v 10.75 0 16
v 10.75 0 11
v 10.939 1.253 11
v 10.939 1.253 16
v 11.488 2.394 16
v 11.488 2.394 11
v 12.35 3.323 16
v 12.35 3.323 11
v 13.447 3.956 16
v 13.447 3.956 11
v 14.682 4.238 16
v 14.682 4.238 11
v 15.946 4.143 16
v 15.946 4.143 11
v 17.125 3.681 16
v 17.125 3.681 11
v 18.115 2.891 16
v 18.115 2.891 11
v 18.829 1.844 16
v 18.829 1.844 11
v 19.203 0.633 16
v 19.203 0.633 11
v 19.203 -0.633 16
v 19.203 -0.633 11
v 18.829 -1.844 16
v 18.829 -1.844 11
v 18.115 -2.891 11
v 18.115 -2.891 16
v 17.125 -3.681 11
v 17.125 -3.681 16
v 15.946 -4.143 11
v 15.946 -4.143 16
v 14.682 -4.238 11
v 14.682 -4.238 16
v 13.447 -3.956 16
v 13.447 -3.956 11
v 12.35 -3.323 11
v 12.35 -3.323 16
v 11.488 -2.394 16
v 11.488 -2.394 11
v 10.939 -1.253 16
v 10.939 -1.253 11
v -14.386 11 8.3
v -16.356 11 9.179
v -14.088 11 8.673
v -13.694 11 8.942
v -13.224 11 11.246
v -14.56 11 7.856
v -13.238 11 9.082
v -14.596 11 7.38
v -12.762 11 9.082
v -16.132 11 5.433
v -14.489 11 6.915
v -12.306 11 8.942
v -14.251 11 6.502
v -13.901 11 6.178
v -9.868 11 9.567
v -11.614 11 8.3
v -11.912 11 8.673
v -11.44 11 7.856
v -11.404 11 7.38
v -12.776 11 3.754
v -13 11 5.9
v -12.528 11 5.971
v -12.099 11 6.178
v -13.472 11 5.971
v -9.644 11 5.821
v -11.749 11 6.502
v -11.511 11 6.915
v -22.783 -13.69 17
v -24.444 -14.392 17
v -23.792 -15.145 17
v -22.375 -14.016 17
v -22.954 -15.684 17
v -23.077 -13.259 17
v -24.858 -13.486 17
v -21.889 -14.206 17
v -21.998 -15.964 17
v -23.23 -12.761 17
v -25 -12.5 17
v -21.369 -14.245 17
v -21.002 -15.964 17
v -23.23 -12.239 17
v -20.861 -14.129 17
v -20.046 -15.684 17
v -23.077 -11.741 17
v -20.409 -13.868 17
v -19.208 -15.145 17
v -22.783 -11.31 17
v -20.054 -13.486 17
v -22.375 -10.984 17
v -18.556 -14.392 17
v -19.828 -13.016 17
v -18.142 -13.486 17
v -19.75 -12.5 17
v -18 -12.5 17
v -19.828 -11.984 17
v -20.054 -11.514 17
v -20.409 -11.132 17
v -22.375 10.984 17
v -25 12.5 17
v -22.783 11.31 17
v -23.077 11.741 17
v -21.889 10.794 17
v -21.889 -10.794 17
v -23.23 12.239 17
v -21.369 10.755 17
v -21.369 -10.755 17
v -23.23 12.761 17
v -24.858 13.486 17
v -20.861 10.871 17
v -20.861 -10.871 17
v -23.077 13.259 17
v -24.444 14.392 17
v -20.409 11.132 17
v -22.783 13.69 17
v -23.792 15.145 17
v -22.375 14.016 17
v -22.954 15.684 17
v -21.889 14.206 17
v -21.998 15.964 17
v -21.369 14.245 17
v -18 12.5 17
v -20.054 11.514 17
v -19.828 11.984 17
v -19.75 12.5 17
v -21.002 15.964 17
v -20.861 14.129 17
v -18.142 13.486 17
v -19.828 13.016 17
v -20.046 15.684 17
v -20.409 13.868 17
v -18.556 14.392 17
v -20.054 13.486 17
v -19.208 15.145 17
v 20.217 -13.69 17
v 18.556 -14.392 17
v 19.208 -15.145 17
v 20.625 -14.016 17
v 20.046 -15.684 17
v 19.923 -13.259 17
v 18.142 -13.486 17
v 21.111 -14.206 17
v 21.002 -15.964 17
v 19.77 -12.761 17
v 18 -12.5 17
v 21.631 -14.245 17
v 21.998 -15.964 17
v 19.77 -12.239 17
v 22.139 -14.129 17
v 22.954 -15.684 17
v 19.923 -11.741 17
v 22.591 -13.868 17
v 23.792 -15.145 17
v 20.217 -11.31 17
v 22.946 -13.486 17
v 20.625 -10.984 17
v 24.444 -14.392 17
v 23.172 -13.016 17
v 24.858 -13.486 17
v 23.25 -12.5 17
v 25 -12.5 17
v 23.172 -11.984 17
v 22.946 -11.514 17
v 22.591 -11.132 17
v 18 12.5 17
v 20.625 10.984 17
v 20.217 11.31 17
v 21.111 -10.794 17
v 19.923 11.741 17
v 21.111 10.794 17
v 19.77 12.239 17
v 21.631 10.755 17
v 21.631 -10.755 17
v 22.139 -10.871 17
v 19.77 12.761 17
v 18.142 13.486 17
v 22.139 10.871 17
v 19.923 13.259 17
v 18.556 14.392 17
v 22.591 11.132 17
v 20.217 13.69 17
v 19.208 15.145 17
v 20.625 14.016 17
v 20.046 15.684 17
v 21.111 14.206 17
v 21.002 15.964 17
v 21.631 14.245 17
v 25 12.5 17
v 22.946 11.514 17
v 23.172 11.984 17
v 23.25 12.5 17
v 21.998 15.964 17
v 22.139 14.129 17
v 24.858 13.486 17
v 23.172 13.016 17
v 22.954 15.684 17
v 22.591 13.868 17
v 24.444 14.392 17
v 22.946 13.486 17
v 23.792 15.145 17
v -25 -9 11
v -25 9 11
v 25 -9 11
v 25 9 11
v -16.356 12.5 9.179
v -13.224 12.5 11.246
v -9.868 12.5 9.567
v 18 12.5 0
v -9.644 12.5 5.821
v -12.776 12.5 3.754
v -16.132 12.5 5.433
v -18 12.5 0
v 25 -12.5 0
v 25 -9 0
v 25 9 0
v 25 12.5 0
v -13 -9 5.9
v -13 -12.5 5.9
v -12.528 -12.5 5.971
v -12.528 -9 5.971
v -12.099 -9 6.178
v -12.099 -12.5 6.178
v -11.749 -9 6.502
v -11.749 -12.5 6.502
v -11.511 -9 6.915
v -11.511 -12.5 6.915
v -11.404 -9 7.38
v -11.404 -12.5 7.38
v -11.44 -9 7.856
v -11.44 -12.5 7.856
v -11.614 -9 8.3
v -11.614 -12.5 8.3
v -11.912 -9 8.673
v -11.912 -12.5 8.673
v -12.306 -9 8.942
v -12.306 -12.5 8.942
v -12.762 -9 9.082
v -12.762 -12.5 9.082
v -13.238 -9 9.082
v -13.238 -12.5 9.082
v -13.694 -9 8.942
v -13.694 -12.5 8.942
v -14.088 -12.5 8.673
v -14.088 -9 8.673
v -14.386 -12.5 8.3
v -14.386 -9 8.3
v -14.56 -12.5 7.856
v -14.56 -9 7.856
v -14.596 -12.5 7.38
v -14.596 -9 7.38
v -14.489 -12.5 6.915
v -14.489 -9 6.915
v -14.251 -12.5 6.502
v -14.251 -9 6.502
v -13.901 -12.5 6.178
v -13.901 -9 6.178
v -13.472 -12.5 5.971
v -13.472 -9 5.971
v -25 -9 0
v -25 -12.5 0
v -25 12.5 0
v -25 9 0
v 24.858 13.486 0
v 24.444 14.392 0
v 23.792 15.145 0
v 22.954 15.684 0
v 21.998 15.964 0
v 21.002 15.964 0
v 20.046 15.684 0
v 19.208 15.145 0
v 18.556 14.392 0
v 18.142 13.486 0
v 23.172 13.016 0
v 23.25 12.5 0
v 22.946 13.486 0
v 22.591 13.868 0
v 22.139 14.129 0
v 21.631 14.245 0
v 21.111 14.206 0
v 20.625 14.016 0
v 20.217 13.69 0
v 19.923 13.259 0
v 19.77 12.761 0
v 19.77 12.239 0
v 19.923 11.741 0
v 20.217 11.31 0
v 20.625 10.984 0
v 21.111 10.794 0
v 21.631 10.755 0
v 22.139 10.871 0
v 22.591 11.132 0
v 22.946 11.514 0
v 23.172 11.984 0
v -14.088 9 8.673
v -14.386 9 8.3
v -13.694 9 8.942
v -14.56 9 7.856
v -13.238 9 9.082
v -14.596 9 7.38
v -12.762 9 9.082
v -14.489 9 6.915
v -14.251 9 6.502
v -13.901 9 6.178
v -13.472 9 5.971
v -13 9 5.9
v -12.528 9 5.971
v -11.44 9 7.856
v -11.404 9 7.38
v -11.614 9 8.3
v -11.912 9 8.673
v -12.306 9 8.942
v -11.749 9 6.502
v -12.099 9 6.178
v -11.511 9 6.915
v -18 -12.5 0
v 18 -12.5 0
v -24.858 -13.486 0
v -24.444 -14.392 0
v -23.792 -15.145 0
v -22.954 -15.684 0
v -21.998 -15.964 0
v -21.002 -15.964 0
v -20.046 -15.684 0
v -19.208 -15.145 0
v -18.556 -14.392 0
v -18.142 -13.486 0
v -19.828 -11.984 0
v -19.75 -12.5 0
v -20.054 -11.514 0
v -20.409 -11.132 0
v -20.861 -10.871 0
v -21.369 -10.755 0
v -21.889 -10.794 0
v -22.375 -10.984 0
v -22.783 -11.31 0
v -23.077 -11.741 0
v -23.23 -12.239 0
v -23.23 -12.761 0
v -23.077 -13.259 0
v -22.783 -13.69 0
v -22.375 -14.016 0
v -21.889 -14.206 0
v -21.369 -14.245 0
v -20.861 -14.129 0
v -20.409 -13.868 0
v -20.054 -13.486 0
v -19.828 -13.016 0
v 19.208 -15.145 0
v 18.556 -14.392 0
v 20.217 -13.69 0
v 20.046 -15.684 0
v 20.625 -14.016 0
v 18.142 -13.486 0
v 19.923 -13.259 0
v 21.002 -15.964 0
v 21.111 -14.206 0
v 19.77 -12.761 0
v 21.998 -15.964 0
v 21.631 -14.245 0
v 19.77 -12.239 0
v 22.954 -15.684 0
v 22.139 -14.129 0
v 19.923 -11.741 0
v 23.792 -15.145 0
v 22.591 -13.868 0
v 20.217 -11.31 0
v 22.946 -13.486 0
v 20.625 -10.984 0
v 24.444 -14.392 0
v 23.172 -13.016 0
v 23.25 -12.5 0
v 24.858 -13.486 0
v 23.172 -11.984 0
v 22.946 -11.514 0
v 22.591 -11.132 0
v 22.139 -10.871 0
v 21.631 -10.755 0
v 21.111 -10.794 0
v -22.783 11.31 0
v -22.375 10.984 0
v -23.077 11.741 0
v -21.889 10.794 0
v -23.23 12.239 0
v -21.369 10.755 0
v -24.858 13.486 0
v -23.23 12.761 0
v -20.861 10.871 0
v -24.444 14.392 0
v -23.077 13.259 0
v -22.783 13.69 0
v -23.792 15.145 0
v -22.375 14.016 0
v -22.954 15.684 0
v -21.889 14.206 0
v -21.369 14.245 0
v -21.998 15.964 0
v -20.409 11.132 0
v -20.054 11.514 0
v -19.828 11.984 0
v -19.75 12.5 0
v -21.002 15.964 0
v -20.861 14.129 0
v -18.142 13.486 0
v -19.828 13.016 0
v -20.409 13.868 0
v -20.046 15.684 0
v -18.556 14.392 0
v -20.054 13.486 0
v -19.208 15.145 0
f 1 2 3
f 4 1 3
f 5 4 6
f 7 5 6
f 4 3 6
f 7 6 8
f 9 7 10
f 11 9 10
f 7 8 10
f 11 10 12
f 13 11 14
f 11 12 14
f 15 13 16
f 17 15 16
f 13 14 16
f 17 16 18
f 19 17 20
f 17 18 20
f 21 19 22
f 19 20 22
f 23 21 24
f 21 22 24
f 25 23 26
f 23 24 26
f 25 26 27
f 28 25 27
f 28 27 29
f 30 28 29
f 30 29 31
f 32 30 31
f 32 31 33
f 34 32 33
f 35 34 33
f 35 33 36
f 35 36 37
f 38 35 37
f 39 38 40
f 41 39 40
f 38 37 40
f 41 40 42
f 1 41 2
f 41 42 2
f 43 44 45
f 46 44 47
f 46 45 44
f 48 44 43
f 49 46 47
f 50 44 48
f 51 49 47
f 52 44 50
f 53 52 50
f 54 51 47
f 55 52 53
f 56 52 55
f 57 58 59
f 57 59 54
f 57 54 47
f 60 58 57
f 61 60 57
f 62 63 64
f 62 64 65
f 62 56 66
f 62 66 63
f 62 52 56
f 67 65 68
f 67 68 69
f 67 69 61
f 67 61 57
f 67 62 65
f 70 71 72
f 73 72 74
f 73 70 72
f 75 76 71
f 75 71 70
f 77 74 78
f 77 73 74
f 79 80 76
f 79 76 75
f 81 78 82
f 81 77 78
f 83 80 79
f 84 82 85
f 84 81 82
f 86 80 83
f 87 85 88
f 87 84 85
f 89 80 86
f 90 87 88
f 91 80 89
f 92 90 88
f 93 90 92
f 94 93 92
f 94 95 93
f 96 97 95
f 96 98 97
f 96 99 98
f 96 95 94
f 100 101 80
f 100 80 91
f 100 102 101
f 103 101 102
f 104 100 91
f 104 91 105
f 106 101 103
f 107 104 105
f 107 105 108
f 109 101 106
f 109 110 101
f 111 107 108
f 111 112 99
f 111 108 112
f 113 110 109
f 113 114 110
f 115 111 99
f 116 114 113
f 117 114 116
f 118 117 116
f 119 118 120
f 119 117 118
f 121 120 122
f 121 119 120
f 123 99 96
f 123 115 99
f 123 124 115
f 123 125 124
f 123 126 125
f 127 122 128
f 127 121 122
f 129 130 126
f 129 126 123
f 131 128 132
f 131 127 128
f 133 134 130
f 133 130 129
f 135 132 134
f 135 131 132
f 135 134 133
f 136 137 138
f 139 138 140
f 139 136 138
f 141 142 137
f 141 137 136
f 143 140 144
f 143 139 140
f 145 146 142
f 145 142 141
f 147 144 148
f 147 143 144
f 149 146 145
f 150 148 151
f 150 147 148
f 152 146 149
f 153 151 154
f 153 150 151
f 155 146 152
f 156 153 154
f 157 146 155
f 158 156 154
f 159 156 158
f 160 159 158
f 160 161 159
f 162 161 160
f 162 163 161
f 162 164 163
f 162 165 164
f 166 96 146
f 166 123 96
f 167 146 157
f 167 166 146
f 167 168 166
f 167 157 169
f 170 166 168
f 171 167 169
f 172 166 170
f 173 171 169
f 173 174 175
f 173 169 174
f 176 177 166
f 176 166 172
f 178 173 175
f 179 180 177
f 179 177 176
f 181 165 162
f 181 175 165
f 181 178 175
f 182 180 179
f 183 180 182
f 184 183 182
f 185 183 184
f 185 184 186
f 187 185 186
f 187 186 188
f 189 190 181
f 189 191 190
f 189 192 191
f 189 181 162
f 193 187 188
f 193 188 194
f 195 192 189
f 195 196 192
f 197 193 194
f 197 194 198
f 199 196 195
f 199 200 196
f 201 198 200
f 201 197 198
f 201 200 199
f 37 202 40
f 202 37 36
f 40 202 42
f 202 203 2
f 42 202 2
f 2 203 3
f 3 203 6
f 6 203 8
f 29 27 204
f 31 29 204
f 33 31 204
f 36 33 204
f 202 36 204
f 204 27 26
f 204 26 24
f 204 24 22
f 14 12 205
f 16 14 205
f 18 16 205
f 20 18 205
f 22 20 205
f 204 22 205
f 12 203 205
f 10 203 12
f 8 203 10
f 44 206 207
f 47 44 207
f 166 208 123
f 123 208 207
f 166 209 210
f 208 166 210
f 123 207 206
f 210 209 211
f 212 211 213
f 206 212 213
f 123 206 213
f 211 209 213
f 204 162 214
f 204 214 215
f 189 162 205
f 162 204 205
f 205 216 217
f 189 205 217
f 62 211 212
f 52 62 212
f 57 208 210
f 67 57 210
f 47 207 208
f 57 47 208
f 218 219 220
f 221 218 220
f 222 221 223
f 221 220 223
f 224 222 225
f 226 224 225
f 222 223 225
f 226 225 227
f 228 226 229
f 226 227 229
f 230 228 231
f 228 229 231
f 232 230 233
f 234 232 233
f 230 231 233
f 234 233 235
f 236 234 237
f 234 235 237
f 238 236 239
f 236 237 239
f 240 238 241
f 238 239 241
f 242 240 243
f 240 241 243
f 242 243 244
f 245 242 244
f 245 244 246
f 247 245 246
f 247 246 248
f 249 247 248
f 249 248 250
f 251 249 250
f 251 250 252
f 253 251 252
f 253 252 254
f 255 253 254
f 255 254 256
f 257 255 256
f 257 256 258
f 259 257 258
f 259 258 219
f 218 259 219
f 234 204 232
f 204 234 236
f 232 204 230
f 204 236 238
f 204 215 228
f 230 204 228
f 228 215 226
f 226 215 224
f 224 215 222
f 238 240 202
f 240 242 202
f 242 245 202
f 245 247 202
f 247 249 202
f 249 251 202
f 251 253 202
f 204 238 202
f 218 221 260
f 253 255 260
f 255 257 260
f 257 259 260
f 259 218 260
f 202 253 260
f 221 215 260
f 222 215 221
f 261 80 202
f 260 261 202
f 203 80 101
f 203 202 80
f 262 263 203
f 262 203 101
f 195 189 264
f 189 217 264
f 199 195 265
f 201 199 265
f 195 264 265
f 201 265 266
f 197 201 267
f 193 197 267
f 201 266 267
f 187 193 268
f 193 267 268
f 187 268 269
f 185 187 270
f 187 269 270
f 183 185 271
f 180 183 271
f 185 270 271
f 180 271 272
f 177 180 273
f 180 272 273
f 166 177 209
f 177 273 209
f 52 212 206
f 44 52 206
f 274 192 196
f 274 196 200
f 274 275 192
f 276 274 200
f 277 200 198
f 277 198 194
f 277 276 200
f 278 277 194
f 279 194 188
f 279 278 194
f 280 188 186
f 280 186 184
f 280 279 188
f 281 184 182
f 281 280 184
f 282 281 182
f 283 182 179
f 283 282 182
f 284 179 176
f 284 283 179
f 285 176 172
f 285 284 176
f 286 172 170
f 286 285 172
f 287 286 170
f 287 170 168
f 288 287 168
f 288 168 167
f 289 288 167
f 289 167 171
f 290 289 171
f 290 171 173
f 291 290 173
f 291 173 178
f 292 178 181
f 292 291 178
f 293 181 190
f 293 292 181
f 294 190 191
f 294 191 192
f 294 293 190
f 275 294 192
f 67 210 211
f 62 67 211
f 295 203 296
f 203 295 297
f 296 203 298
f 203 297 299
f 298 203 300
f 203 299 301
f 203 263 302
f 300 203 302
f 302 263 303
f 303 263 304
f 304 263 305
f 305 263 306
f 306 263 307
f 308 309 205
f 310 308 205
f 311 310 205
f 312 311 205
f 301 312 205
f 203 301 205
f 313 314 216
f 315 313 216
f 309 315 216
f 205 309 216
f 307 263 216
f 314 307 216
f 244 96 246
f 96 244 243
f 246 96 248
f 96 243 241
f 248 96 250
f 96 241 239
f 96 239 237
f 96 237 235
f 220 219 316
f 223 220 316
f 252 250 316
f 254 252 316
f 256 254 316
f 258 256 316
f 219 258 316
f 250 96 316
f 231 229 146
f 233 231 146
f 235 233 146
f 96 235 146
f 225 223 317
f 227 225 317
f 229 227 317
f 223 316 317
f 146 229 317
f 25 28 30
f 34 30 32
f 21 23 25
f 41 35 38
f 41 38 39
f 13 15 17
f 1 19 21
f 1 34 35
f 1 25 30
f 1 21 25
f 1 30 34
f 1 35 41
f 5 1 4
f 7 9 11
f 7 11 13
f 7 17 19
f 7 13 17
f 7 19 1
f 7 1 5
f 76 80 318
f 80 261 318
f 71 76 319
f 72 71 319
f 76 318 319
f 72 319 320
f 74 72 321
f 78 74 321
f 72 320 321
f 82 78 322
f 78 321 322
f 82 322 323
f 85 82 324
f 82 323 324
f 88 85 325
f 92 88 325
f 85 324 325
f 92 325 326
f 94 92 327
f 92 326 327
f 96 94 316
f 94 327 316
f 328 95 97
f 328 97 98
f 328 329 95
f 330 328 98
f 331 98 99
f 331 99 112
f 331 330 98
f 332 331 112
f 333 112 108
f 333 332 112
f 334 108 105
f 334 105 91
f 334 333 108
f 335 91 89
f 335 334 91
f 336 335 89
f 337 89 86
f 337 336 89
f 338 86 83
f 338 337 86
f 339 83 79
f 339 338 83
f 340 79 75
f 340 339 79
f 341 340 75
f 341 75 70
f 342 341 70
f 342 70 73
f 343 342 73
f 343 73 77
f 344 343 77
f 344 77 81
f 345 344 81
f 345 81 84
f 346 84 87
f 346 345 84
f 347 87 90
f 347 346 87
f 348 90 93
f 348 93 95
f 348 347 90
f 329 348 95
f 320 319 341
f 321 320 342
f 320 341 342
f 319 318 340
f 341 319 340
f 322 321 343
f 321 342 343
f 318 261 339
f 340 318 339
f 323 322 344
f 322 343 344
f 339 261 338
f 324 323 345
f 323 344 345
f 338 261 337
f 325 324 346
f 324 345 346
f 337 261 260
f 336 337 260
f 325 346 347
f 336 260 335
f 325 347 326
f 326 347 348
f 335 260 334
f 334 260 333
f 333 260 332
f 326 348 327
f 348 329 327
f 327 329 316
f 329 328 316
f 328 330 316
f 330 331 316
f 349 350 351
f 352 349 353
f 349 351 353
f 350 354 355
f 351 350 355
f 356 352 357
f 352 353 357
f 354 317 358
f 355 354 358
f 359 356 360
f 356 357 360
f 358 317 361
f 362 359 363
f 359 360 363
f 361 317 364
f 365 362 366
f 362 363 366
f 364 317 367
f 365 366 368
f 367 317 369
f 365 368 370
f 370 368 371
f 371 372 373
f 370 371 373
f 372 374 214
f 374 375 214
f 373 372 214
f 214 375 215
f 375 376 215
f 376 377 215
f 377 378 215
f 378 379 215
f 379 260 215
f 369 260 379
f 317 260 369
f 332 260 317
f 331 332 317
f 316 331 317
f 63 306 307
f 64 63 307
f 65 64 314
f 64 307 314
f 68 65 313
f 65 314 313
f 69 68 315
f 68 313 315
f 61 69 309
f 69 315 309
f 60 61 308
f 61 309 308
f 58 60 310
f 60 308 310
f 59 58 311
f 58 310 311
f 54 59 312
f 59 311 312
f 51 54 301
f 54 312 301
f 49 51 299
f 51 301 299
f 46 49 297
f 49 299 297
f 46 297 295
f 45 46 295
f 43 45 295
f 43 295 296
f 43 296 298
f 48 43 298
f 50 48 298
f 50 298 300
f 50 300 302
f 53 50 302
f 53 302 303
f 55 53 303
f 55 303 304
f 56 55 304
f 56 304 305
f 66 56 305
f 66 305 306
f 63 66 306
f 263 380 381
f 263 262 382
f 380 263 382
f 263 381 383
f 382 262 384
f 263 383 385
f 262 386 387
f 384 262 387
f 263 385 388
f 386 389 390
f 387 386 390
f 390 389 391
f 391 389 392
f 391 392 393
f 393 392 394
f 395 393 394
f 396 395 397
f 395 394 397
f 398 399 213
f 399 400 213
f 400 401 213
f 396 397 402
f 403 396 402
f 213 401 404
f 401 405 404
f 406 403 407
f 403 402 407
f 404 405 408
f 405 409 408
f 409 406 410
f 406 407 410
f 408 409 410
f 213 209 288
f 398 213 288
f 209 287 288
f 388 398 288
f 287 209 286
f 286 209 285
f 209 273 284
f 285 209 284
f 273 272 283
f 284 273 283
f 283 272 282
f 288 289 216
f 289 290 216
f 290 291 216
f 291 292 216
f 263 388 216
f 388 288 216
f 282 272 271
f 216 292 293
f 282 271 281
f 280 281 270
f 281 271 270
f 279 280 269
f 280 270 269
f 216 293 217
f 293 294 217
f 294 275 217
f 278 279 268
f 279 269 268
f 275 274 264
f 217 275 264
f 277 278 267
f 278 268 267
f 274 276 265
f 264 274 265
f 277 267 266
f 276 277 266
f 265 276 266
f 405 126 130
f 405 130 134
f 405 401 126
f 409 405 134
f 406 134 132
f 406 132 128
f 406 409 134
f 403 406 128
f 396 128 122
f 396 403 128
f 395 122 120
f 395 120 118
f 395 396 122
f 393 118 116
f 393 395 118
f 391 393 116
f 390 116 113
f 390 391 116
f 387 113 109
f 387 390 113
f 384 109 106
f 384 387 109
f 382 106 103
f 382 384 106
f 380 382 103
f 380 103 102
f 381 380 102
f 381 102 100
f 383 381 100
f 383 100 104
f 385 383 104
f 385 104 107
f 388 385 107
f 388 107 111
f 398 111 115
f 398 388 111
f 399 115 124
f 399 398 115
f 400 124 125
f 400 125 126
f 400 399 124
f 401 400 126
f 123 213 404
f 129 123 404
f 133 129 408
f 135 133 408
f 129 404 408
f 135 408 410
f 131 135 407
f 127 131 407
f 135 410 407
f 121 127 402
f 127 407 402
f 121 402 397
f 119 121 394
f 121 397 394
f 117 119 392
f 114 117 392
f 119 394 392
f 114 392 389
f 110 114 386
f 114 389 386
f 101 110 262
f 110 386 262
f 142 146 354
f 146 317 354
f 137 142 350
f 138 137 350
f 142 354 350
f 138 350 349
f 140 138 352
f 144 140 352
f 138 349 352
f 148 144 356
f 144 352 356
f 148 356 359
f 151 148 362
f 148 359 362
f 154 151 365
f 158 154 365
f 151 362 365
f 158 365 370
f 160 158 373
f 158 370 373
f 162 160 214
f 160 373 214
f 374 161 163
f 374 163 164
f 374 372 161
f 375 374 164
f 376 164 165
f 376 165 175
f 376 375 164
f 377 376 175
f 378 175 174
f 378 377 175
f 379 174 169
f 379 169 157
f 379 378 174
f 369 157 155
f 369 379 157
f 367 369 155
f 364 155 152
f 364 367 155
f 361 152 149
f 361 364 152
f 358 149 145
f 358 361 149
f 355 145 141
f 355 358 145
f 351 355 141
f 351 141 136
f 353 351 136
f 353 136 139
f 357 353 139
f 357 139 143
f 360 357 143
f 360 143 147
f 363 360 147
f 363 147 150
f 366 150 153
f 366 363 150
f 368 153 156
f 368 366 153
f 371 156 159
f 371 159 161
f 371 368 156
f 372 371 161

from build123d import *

# Parameters (mm, degrees)
SKETCH1_R             = 1.75
BOSS_EXTRUDE1_DEPTH   = 11
BOSS_EXTRUDE1_2_DEPTH = 11
BOSS_EXTRUDE2_START   = 11
SKETCH1_3_W           = 50
SKETCH1_3_H           = 18
SKETCH1_3_R           = 1.75
BOSS_EXTRUDE2_DEPTH   = 6
SKETCH3_R             = 4.25
CUT_EXTRUDE1_DEPTH    = 5
SKETCH4_R             = 1.6
CUT_EXTRUDE2_DEPTH    = 42.548164821
CUT_EXTRUDE3_DEPTH    = 1.5


with BuildPart() as part:
    # Sketch1 → Boss-Extrude1 (new body)
    with BuildSketch(Plane.XY):
        with BuildLine():
            Line((18, 12.5), (-18, 12.5))
            ThreePointArc((-18, 12.5), (-21.5, 16), (-25, 12.5))
            Line((-25, 12.5), (-25, 9))
            Line((-25, 9), (25, 9))
            Line((25, 9), (25, 12.5))
            ThreePointArc((25, 12.5), (21.5, 16), (18, 12.5))
        make_face()
        with Locations((-21.5, 12.5)):
            Circle(SKETCH1_R, mode=Mode.SUBTRACT)
        with Locations((21.5, 12.5)):
            Circle(SKETCH1_R, mode=Mode.SUBTRACT)
    extrude(amount=BOSS_EXTRUDE1_DEPTH)



with BuildPart() as body_2:
    # Sketch1 → Boss-Extrude1 2 (new body)
    with BuildSketch(Plane.XY):
        with BuildLine():
            Line((25, -9), (-25, -9))
            Line((-25, -9), (-25, -12.5))
            ThreePointArc((-25, -12.5), (-21.5, -16), (-18, -12.5))
            Line((-18, -12.5), (18, -12.5))
            ThreePointArc((18, -12.5), (21.5, -16), (25, -12.5))
            Line((25, -12.5), (25, -9))
        make_face()
        with Locations((-21.5, -12.5)):
            Circle(SKETCH1_R, mode=Mode.SUBTRACT)
        with Locations((21.5, -12.5)):
            Circle(SKETCH1_R, mode=Mode.SUBTRACT)
    extrude(amount=BOSS_EXTRUDE1_2_DEPTH)


with BuildPart() as part_1:
    add(part.part)

    add(body_2.part)  # Boss-Extrude2 merges body 2
    # Sketch1<3> → Boss-Extrude2 (add)
    # profile 1 of 3: a face of its own
    with BuildSketch(Plane.XY.offset(BOSS_EXTRUDE2_START)):
        Rectangle(SKETCH1_3_W, SKETCH1_3_H)
    # profile 2 of 3: a face of its own
    with BuildSketch(Plane.XY.offset(BOSS_EXTRUDE2_START)):
        with BuildLine():
            Line((18, 12.5), (-18, 12.5))
            ThreePointArc((-18, 12.5), (-21.5, 16), (-25, 12.5))
            Line((-25, 12.5), (-25, 9))
            Line((-25, 9), (25, 9))
            Line((25, 9), (25, 12.5))
            ThreePointArc((25, 12.5), (21.5, 16), (18, 12.5))
        make_face()
        with Locations((-21.5, 12.5)):
            Circle(SKETCH1_3_R, mode=Mode.SUBTRACT)
        with Locations((21.5, 12.5)):
            Circle(SKETCH1_3_R, mode=Mode.SUBTRACT)
    # profile 3 of 3: a face of its own
    with BuildSketch(Plane.XY.offset(BOSS_EXTRUDE2_START)):
        with BuildLine():
            Line((25, -9), (-25, -9))
            Line((-25, -9), (-25, -12.5))
            ThreePointArc((-25, -12.5), (-21.5, -16), (-18, -12.5))
            Line((-18, -12.5), (18, -12.5))
            ThreePointArc((18, -12.5), (21.5, -16), (25, -12.5))
            Line((25, -12.5), (25, -9))
        make_face()
        with Locations((-21.5, -12.5)):
            Circle(SKETCH1_3_R, mode=Mode.SUBTRACT)
        with Locations((21.5, -12.5)):
            Circle(SKETCH1_3_R, mode=Mode.SUBTRACT)
    extrude(amount=BOSS_EXTRUDE2_DEPTH)

    # Sketch3 → Cut-Extrude1 (cut)
    with BuildSketch(Plane(origin=(0, 0, 11), x_dir=(-1, 0, 0), z_dir=(0, 0, -1))):
        with Locations((-15, 0)):
            Circle(SKETCH3_R)
    extrude(amount=-CUT_EXTRUDE1_DEPTH, mode=Mode.SUBTRACT)

    # Sketch4 → Cut-Extrude2 (cut, through all)
    with BuildSketch(Plane.XZ.offset(12.5)):
        with Locations(Location((-13, 7.5, 0), (0, 0, 270))):
            Circle(SKETCH4_R)
    extrude(amount=-CUT_EXTRUDE2_DEPTH, mode=Mode.SUBTRACT)

    # Sketch5 → Cut-Extrude3 (cut)
    with BuildSketch(Plane(origin=(0, 12.5, 0), x_dir=(1, 0, 0), z_dir=(0, 1, 0))):
        Polygon((-9.868012442, -9.567362395), (-9.643617868, -5.821300408), (-12.775605426, -3.753938013), (-16.131987558, -5.432637605), (-16.356382132, -9.178699592), (-13.224394574, -11.246061987), align=None)
    extrude(amount=-CUT_EXTRUDE3_DEPTH, mode=Mode.SUBTRACT)


solid = part_1.part
